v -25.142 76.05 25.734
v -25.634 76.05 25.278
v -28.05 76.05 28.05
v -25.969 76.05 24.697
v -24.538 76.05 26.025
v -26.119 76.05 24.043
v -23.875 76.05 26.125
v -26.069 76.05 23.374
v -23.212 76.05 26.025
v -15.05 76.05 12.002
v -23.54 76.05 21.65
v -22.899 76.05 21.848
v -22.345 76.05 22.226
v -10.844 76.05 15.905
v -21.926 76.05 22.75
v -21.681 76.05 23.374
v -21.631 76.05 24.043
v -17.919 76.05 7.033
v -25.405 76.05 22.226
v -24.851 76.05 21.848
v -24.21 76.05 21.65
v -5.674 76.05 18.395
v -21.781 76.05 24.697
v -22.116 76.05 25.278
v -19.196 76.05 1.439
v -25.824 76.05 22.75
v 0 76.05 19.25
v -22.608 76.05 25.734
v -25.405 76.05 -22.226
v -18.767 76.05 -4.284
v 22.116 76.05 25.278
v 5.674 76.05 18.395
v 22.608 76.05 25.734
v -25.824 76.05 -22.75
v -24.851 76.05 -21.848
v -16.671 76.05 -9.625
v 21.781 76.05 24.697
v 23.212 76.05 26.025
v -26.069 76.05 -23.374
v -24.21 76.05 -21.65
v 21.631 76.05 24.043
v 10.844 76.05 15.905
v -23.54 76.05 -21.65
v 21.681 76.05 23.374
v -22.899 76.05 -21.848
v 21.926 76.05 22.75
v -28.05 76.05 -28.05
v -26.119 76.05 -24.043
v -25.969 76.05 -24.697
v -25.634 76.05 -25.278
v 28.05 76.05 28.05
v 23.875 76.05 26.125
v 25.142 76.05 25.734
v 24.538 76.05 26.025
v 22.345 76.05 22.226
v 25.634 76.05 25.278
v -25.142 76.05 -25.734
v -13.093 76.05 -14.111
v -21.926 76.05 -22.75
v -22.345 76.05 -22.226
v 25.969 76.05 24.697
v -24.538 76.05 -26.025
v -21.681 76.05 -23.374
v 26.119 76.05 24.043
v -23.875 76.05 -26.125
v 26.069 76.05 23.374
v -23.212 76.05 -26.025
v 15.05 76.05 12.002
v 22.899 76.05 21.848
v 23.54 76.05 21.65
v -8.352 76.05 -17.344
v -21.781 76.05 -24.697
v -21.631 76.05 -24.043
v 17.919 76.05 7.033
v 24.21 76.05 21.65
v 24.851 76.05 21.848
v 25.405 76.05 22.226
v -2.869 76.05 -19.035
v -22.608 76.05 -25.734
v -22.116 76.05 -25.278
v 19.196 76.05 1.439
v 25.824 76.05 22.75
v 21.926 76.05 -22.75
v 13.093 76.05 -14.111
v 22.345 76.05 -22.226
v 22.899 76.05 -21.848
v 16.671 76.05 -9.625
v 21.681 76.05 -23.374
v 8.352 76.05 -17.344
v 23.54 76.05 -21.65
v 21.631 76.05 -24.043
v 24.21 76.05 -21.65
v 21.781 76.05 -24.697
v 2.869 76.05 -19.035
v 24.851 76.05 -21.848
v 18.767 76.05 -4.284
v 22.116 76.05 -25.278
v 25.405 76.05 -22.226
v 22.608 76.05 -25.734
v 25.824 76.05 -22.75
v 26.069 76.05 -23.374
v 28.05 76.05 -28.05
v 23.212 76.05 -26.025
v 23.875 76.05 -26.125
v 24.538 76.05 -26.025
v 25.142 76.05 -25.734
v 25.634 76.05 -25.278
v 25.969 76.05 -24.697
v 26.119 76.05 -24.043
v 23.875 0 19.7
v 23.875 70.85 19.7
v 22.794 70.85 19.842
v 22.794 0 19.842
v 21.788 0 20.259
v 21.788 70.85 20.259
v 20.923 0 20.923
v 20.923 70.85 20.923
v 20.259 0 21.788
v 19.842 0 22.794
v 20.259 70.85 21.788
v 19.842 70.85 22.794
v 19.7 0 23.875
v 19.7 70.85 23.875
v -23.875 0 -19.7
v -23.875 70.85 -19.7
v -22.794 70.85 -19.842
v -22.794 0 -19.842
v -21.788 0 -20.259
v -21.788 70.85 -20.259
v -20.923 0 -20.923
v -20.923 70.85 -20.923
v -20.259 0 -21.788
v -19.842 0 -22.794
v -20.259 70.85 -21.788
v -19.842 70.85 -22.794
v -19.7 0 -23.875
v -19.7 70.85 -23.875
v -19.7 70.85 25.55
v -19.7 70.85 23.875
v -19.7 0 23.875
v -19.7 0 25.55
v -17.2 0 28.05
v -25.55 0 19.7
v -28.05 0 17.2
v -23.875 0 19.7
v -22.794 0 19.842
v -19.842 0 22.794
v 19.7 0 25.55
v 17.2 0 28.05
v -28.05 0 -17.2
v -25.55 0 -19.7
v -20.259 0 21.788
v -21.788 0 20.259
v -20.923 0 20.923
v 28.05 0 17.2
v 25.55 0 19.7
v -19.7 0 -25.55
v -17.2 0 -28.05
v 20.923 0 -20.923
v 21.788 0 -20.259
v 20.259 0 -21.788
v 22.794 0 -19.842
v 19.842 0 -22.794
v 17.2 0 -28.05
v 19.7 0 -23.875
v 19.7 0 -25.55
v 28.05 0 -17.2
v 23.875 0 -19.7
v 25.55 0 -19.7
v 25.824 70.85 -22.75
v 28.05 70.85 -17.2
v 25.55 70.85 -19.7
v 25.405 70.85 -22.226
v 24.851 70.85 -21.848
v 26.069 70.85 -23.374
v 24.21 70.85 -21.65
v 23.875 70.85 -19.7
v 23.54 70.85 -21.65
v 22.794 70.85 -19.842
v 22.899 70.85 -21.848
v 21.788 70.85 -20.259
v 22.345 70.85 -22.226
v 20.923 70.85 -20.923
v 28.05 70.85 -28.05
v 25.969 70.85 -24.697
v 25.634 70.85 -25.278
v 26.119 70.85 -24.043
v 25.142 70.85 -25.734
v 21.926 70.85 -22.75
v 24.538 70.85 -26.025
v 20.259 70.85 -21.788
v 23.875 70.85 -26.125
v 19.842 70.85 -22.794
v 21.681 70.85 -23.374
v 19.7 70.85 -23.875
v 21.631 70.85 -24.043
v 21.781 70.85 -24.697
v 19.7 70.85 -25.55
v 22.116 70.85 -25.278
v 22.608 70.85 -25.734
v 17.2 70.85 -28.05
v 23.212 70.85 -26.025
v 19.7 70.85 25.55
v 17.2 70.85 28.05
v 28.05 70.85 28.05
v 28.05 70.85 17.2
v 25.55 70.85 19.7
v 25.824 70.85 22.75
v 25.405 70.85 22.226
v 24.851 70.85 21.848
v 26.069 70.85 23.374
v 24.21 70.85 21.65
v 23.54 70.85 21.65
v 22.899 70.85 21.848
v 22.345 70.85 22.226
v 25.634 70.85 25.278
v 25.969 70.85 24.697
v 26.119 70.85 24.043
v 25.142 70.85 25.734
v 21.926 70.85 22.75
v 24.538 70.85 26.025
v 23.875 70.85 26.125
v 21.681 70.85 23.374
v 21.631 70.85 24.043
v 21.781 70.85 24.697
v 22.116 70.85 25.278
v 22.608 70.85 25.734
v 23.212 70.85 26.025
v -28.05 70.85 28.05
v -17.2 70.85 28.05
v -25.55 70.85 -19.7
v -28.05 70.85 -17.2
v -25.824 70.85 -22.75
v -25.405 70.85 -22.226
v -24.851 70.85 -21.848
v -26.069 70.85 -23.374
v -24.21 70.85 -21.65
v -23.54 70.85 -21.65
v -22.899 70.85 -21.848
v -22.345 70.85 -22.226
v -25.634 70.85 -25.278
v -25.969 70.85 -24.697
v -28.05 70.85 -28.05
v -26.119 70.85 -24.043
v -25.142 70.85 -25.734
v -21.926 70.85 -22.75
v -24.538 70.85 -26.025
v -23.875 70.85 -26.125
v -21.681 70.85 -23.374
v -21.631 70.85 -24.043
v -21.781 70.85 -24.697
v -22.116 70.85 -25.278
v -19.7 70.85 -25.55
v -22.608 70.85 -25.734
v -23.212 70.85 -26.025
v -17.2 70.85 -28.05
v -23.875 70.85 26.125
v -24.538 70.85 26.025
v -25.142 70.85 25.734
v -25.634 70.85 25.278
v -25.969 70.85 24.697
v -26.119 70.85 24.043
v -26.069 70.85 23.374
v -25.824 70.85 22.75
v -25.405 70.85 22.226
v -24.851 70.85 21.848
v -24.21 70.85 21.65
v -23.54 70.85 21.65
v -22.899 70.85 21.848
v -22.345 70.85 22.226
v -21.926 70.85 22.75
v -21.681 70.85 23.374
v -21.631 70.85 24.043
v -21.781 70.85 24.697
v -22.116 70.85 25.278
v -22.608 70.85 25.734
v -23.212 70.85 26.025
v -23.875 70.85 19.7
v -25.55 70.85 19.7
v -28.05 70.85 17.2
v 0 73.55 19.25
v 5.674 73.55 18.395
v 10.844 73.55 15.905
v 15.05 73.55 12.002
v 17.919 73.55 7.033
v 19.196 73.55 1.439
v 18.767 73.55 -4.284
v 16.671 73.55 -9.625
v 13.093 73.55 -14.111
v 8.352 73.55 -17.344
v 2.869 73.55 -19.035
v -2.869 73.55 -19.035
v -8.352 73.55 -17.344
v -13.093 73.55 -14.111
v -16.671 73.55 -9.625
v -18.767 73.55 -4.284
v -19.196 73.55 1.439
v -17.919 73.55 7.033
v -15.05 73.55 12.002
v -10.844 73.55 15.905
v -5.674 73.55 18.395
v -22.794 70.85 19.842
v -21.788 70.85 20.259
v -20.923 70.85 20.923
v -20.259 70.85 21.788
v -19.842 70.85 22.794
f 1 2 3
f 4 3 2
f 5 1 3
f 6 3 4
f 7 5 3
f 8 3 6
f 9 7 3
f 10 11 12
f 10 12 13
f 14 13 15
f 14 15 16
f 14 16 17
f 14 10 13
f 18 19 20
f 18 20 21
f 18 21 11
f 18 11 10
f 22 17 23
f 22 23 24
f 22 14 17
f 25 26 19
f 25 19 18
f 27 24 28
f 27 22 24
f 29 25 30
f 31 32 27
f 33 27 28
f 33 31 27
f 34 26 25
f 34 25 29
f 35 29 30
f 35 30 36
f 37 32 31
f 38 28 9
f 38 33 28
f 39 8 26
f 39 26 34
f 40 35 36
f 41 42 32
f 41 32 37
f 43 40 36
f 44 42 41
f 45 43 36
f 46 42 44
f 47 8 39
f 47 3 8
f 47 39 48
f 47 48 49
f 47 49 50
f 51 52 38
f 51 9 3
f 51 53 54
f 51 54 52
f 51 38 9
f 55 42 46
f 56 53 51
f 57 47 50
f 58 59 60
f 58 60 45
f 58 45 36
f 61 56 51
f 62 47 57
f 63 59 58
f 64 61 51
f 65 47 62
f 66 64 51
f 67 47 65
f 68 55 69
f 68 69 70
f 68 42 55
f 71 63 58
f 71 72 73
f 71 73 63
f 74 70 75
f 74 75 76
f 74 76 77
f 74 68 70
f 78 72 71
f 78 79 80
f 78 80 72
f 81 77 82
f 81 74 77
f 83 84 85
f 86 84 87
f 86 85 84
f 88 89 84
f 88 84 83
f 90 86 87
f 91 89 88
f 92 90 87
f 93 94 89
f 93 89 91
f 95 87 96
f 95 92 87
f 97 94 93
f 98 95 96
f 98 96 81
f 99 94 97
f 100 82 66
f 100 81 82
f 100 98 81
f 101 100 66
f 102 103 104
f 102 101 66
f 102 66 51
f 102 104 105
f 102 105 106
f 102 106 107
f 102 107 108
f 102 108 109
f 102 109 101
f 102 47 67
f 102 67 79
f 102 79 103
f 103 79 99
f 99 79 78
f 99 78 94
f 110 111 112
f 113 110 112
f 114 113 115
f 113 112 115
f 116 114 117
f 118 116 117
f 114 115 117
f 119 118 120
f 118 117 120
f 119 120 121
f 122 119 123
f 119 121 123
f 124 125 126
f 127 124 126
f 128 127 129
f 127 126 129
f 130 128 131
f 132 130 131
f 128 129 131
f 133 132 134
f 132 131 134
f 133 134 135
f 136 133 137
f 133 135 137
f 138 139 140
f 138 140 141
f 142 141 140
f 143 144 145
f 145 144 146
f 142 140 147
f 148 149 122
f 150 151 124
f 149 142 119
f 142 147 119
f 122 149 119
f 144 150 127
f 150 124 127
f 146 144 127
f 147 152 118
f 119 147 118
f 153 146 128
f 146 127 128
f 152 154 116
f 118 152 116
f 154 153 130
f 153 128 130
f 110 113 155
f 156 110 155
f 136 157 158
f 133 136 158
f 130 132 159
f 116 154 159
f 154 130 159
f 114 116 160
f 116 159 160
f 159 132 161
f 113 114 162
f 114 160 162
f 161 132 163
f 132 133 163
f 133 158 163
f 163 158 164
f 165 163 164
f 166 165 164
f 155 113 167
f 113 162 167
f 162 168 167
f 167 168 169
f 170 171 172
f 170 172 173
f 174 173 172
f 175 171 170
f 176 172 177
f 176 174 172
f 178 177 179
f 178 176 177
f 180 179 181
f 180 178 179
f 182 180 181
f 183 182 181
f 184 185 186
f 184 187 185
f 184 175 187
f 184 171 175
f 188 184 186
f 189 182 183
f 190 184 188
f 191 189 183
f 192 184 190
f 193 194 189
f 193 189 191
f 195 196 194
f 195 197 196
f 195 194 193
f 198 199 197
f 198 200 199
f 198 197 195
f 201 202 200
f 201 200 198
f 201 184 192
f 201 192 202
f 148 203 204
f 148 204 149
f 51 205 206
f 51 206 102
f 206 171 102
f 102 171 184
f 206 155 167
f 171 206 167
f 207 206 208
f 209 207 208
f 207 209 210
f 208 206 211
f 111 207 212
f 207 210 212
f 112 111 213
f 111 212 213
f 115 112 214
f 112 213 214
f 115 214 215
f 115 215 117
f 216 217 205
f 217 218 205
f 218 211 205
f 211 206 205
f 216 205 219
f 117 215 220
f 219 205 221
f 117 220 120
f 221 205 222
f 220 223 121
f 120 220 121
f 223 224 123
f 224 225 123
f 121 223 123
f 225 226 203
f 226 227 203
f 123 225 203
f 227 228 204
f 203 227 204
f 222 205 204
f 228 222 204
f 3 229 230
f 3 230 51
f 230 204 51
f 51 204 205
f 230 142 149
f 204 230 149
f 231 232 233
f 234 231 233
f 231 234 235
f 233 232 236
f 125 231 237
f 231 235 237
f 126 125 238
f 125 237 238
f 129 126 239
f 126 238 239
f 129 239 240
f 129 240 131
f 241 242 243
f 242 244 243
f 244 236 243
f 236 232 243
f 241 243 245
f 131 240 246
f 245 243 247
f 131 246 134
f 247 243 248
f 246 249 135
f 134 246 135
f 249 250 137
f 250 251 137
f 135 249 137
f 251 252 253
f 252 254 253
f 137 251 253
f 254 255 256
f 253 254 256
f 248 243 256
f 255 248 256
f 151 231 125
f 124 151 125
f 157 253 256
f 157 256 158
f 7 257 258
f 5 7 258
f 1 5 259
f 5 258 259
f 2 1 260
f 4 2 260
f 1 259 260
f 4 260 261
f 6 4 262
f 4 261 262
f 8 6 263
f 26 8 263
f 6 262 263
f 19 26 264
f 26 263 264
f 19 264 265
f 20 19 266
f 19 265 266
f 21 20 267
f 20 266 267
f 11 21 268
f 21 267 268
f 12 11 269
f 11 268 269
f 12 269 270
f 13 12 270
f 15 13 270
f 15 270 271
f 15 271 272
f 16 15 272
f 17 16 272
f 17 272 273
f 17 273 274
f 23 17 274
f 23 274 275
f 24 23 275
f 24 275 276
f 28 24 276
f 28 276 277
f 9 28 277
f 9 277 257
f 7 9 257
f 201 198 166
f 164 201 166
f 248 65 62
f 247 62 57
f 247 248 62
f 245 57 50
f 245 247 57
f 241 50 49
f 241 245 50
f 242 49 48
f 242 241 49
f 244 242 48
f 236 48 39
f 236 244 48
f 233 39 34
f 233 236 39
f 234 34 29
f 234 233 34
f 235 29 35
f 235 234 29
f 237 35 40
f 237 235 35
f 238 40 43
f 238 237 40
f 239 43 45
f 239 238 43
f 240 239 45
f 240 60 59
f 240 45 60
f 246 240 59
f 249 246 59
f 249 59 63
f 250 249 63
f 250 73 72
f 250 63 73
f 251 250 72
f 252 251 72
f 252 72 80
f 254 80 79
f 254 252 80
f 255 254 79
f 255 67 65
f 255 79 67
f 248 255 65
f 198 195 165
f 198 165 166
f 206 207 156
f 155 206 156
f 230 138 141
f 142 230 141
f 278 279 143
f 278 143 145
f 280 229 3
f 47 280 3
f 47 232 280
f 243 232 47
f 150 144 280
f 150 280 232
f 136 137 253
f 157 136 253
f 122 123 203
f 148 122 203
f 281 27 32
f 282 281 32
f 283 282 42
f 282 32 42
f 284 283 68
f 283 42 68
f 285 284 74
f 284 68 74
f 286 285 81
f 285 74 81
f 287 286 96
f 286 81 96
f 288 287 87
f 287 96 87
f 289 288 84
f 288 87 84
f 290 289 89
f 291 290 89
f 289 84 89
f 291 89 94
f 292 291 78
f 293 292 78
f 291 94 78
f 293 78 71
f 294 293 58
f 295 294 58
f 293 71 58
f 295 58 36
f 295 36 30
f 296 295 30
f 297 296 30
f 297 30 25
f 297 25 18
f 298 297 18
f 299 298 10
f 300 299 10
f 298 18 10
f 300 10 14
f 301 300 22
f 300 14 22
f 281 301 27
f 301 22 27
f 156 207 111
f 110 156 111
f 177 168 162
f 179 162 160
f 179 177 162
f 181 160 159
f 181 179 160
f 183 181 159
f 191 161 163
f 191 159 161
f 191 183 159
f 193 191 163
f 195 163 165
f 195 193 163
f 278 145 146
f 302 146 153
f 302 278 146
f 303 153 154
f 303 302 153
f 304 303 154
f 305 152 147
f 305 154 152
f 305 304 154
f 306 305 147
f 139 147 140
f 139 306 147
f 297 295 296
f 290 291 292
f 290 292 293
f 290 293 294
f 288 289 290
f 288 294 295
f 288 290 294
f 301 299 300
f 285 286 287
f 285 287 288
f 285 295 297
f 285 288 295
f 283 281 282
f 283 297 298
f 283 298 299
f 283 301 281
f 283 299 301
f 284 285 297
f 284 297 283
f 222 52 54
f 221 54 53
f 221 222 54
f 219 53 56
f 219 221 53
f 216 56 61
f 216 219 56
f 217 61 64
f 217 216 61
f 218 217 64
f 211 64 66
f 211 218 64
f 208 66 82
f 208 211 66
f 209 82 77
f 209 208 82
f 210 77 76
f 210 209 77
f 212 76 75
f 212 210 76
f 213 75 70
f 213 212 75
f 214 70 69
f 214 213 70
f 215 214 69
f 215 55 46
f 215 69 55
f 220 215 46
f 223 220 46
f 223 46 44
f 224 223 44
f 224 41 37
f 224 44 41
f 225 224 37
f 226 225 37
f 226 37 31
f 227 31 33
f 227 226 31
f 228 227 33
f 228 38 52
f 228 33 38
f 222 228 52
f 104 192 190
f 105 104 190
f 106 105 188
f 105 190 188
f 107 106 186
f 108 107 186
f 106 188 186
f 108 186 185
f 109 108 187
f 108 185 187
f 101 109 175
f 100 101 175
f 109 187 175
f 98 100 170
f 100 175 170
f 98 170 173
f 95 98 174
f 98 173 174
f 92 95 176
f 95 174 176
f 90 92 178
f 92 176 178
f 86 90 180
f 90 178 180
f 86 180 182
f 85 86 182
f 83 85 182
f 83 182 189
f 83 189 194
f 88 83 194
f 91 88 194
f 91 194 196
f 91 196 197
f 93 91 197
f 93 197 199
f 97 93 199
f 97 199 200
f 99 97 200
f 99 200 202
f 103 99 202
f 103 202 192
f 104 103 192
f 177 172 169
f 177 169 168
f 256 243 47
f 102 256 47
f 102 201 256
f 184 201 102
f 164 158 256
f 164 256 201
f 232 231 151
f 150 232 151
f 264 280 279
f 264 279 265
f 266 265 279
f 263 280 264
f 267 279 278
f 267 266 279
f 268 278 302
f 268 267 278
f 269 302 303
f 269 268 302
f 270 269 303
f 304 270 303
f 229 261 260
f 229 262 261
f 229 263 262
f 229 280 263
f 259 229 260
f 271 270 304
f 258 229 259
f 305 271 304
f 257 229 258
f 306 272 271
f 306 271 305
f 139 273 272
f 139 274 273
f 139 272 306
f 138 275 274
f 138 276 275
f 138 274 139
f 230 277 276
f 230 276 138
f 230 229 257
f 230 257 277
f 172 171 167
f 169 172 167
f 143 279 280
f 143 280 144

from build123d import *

# Parameters (mm, degrees)
CROQUIS1_W                                 = 56.1
CROQUIS1_H                                 = 56.1
SALIENTE_EXTRUIR1_DEPTH                    = 76.05
CORTAR_EXTRUIR1_DEPTH                      = 82.199307263
SIMETR_A3_AT_THE_SECOND_PLANE_COPY_1_DEPTH = 82.199307263
CHAFL_N1_SIZE                              = 2.5
CROQUIS3_R                                 = 2.25
CORTAR_EXTRUIR2_DEPTH                      = 82.199307263
SIMETR_A4_AT_THE_SECOND_PLANE_COPY_1_SKE_R = 2.25
SIMETR_A4_AT_THE_SECOND_PLANE_COPY_1_DEPTH = 82.199307263
CROQUIS4_R                                 = 19.25
CORTAR_EXTRUIR3_DEPTH                      = 2.5


with BuildPart() as part:
    # Croquis1 → Saliente-Extruir1 (new body)
    with BuildSketch(Plane(origin=(0, 0, 0), x_dir=(1, 0, 0), z_dir=(0, 1, 0))):
        Rectangle(CROQUIS1_W, CROQUIS1_H)
    extrude(amount=SALIENTE_EXTRUIR1_DEPTH)

    # Croquis2 → Cortar-Extruir1 (cut, through all)
    with BuildSketch(Plane(origin=(0, 70.85, 0), x_dir=(1, 0, 0), z_dir=(0, 1, 0))):
        with BuildLine():
            Line((-28.05, 19.7), (-23.875, 19.7))
            ThreePointArc((-23.875, 19.7), (-20.922829189, 20.922829189), (-19.7, 23.875))
            Line((-19.7, 23.875), (-19.7, 28.05))
            Line((-19.7, 28.05), (-28.05, 28.05))
            Line((-28.05, 28.05), (-28.05, 19.7))
        make_face()
    cortar_extruir1 = extrude(amount=-CORTAR_EXTRUIR1_DEPTH, mode=Mode.SUBTRACT)

    # Simetría3: Cortar-Extruir1 across plane
    add(cortar_extruir1.mirror(Plane(origin=(0, 0, 0), x_dir=(0, 0, 1), z_dir=(1, 0, 0))), mode=Mode.SUBTRACT)

    # Simetría3 at the second plane: Cortar-Extruir1 across plane
    add(cortar_extruir1.mirror(Plane.XY), mode=Mode.SUBTRACT)

    # Simetría3 at the second plane copy 1 ske → Simetría3 at the second plane copy 1 (cut, through all)
    with BuildSketch(Plane(origin=(0, 70.85, 0), x_dir=(-1, 0, 0), z_dir=(0, 1, 0))):
        with BuildLine():
            Line((-28.05, 19.7), (-23.875, 19.7))
            ThreePointArc((-23.875, 19.7), (-20.922829189, 20.922829189), (-19.7, 23.875))
            Line((-19.7, 23.875), (-19.7, 28.05))
            Line((-19.7, 28.05), (-28.05, 28.05))
            Line((-28.05, 28.05), (-28.05, 19.7))
        make_face()
    extrude(amount=-SIMETR_A3_AT_THE_SECOND_PLANE_COPY_1_DEPTH, mode=Mode.SUBTRACT)

    # Chaflán1
    chafl_n1_edges = [part.edges().sort_by_distance(p)[0] for p in [
        (-28.05, 35.425, -19.7),
        (-19.7, 35.425, -28.05),
        (-28.05, 35.425, 19.7),
        (-19.7, 35.425, 28.05),
        (28.05, 35.425, -19.7),
        (19.7, 35.425, -28.05),
        (28.05, 35.425, 19.7),
        (19.7, 35.425, 28.05),
    ]]
    chamfer(chafl_n1_edges, length=CHAFL_N1_SIZE)

    # Croquis3 → Cortar-Extruir2 (cut, through all)
    with BuildSketch(Plane.XZ.offset(-70.85)):
        with Locations(Location((23.875, -23.875, 0), (0, 0, 270))):
            Circle(CROQUIS3_R)
    cortar_extruir2 = extrude(amount=-CORTAR_EXTRUIR2_DEPTH, mode=Mode.SUBTRACT)

    # Simetría4: Cortar-Extruir2 across plane
    add(cortar_extruir2.mirror(Plane(origin=(0, 0, 0), x_dir=(0, 0, 1), z_dir=(1, 0, 0))), mode=Mode.SUBTRACT)

    # Simetría4 at the second plane: Cortar-Extruir2 across plane
    add(cortar_extruir2.mirror(Plane.XY), mode=Mode.SUBTRACT)

    # Simetría4 at the second plane copy 1 ske → Simetría4 at the second plane copy 1 (cut, through all)
    with BuildSketch(Plane(origin=(0, 70.85, 0), x_dir=(-1, 0, 0), z_dir=(0, -1, 0))):
        with Locations(Location((23.875, -23.875, 0), (0, 0, 270))):
            Circle(SIMETR_A4_AT_THE_SECOND_PLANE_COPY_1_SKE_R)
    extrude(amount=-SIMETR_A4_AT_THE_SECOND_PLANE_COPY_1_DEPTH, mode=Mode.SUBTRACT)

    # Croquis4 → Cortar-Extruir3 (cut)
    with BuildSketch(Plane(origin=(0, 76.05, 0), x_dir=(1, 0, 0), z_dir=(0, 1, 0))):
        with Locations(Location((0, 0, 0), (0, 0, 270))):
            Circle(CROQUIS4_R)
    extrude(amount=-CORTAR_EXTRUIR3_DEPTH, mode=Mode.SUBTRACT)


solid = part.part
